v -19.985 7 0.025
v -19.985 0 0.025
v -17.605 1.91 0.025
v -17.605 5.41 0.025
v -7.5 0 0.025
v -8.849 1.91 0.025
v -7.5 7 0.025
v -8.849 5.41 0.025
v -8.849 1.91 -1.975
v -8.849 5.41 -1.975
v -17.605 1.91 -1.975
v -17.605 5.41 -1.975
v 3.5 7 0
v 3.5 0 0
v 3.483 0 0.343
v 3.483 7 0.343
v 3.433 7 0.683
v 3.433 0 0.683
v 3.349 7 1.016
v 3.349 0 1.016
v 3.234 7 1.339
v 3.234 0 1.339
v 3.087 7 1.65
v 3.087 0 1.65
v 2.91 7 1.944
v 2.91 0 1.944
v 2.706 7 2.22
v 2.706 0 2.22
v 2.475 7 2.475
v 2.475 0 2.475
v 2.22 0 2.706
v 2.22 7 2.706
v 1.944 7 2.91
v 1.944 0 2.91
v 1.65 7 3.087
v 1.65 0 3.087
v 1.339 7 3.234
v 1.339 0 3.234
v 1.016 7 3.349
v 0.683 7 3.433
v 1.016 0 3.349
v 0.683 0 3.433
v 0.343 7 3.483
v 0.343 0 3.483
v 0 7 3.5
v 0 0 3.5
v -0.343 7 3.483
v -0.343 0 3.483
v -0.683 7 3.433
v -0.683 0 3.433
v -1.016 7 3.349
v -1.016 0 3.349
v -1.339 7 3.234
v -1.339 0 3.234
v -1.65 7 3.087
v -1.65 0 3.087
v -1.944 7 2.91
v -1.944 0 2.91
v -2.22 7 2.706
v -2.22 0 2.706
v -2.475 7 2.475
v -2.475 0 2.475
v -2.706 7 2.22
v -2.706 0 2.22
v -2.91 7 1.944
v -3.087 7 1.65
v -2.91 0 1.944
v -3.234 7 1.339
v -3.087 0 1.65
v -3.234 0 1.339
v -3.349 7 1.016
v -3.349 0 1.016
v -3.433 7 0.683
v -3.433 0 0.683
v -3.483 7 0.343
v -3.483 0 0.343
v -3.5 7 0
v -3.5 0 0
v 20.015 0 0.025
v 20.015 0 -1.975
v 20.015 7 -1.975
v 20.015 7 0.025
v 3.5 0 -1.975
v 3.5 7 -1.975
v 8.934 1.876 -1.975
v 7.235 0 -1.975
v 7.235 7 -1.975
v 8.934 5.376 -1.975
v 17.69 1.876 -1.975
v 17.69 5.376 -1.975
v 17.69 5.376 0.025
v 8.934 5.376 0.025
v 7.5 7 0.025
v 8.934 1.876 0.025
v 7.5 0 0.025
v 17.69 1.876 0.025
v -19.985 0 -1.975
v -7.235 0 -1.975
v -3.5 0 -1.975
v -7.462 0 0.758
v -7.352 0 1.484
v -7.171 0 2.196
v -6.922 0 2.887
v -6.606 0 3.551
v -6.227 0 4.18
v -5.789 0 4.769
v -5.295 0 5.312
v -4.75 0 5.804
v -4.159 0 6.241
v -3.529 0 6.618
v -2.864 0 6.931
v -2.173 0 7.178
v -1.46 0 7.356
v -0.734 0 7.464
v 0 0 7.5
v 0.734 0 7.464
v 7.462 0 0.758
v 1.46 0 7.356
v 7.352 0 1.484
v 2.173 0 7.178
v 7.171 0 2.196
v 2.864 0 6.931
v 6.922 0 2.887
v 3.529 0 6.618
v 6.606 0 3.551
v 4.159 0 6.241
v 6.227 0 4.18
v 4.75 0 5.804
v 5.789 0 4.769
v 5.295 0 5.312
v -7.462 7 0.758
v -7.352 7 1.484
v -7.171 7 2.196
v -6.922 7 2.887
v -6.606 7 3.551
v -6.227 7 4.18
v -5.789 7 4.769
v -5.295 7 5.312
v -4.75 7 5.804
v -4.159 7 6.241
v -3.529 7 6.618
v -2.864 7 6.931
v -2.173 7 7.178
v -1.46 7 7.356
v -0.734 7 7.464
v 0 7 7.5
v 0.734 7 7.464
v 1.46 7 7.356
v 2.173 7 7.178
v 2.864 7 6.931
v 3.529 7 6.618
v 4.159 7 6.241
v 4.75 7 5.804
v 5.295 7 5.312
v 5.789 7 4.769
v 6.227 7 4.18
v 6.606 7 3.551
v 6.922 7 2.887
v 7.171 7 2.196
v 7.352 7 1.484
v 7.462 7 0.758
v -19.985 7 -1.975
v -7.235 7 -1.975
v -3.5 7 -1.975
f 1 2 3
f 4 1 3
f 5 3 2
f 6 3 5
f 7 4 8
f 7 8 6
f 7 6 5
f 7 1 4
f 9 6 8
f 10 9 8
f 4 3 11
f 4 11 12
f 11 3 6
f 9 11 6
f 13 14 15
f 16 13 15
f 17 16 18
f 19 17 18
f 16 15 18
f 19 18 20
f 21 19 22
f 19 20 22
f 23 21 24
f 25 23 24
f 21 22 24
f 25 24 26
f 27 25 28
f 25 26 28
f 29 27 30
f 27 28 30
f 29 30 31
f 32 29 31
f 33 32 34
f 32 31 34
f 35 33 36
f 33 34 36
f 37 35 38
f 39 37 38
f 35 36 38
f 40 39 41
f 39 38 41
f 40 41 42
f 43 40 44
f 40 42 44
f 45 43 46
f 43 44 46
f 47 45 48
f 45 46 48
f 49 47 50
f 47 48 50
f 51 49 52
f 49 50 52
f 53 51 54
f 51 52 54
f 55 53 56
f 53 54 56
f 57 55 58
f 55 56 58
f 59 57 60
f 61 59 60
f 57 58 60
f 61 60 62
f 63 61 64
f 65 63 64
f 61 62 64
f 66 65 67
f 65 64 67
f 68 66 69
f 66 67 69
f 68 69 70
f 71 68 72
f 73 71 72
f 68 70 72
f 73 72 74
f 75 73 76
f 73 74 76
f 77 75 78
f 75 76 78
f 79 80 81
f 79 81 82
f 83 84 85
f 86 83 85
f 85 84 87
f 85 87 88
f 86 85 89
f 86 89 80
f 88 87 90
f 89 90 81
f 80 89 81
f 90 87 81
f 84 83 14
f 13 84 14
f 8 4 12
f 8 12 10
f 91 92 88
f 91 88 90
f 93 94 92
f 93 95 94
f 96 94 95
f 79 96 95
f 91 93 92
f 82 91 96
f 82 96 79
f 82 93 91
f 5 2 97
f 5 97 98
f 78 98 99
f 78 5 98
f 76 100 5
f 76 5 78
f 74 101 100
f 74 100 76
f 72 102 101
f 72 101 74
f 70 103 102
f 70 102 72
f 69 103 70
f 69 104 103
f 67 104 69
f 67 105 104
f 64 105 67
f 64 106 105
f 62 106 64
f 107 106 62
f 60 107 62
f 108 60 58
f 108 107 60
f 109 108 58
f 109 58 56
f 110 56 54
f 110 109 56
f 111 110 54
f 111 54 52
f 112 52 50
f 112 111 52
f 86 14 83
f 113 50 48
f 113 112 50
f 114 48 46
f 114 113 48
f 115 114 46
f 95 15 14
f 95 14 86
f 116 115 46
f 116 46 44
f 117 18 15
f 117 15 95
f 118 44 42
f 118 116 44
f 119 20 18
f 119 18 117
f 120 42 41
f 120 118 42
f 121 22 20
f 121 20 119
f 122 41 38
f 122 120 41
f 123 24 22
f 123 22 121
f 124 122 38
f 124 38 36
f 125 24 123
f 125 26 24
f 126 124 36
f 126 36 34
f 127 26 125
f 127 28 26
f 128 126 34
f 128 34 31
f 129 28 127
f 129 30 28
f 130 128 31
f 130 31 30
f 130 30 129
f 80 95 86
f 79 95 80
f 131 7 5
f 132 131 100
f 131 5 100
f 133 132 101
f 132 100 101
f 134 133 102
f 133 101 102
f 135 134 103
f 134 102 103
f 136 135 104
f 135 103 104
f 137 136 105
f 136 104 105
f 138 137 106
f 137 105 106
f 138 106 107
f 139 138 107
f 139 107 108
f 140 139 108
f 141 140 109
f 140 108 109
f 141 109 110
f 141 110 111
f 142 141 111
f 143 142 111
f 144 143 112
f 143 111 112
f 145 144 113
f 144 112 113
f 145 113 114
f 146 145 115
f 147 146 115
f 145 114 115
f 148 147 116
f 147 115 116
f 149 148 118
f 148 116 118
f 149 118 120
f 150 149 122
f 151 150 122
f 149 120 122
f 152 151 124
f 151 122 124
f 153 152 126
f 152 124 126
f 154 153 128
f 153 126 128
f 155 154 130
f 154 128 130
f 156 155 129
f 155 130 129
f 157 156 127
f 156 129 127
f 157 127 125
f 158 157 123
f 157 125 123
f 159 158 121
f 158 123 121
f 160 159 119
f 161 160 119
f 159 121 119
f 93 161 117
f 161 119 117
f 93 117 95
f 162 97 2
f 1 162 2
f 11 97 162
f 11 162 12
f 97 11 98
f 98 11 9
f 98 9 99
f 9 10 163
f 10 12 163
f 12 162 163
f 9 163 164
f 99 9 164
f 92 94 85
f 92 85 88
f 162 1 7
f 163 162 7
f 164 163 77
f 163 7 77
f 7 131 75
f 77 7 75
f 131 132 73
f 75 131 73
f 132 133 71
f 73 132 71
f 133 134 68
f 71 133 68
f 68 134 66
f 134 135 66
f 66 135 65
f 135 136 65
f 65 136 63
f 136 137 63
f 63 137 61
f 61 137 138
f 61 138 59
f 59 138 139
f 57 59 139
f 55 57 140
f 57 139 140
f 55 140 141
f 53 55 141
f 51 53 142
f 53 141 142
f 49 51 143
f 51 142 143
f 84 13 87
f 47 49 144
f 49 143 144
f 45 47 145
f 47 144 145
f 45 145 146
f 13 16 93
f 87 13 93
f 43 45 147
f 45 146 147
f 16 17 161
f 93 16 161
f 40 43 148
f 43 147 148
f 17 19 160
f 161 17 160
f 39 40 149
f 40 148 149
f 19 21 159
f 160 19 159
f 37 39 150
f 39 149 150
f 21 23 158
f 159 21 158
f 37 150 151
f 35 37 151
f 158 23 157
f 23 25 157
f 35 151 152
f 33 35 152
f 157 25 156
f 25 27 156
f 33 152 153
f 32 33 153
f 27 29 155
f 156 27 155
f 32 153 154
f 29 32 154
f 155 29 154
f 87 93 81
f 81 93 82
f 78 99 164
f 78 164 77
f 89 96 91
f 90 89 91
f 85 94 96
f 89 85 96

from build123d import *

# Parameters (mm, degrees)
SKETCH_1_R          = 7.5
EXTRUDE_4_DEPTH     = 7
SKETCH_4_W          = 40
SKETCH_4_H          = 2
EXTRUDE_5_DEPTH     = 7
SKETCH_5_W          = 16.420397205
SKETCH_5_H          = 7.153518057
CUT_EXTRUDE_1_DEPTH = 7
SKETCH_6_R          = 5.50001496
CUT_EXTRUDE_2_DEPTH = 7
SKETCH_7_W          = 11.00002992
SKETCH_7_H          = 1.975158718
CUT_EXTRUDE_3_DEPTH = 7
SKETCH_9_W          = 9.755837775
SKETCH_9_H          = 3.5
SKETCH_9_W_2        = 9.755837774
CUT_EXTRUDE_4_DEPTH = 7
SKETCH_10_W         = 1
SKETCH_10_H         = 3.5
EXTRUDE_6_DEPTH     = 2
SKETCH_11_W         = 1
SKETCH_11_H         = 3.5
EXTRUDE_7_DEPTH     = 2
SKETCH_12_R         = 5.944171322
EXTRUDE_8_DEPTH     = 7
SKETCH_13_W         = 14.038978355
SKETCH_13_H         = 4.452309985
CUT_EXTRUDE_5_DEPTH = 7
SKETCH_14_R         = 3.5
CUT_EXTRUDE_6_DEPTH = 7
SKETCH_15_W         = 7
SKETCH_15_H         = 1.975158718
CUT_EXTRUDE_7_DEPTH = 7


with BuildPart() as part:
    # 草图1 → 凸台-拉伸4 (new body)
    with BuildSketch(Plane(origin=(0, 0, 0), x_dir=(1, 0, 0), z_dir=(0, 1, 0))):
        with Locations(Location((0, 0, 0), (0, 0, 270))):
            Circle(SKETCH_1_R)
    extrude(amount=EXTRUDE_4_DEPTH)

    # 草图4 → 凸台-拉伸5 (add)
    with BuildSketch(Plane.XZ):
        with Locations((0.014666229, -0.975158718)):
            Rectangle(SKETCH_4_W, SKETCH_4_H)
    extrude(amount=-EXTRUDE_5_DEPTH)

    # 草图5 → 切除-拉伸1 (cut)
    with BuildSketch(Plane(origin=(0, 0, 0), x_dir=(-1, 0, 0), z_dir=(0, -1, 0))):
        with Locations((-0.974955135, 5.551917747)):
            Rectangle(SKETCH_5_W, SKETCH_5_H)
    extrude(amount=-CUT_EXTRUDE_1_DEPTH, mode=Mode.SUBTRACT)

    # 草图6 → 切除-拉伸2 (cut)
    with BuildSketch(Plane.XZ):
        Circle(SKETCH_6_R)
    extrude(amount=-CUT_EXTRUDE_2_DEPTH, mode=Mode.SUBTRACT)

    # 草图7 → 切除-拉伸3 (cut)
    with BuildSketch(Plane(origin=(0, 7, 0), x_dir=(1, 0, 0), z_dir=(0, 1, 0))):
        with Locations((0, 0.987579359)):
            Rectangle(SKETCH_7_W, SKETCH_7_H)
    extrude(amount=-CUT_EXTRUDE_3_DEPTH, mode=Mode.SUBTRACT)

    # 草图9 → 切除-拉伸4 (cut)
    with BuildSketch(Plane.XY.offset(0.024841282)):
        with Locations((-13.727128122, 3.659671281)):
            Rectangle(SKETCH_9_W, SKETCH_9_H)
        with Locations((13.812208225, 3.62574666)):
            Rectangle(SKETCH_9_W_2, SKETCH_9_H)
    extrude(amount=-CUT_EXTRUDE_4_DEPTH, mode=Mode.SUBTRACT)

    # 草图10 → 凸台-拉伸6 (add)
    with BuildSketch(Plane.XY.offset(0.024841282)):
        with Locations((18.190127112, 3.62574666)):
            Rectangle(SKETCH_10_W, SKETCH_10_H)
    extrude(amount=-EXTRUDE_6_DEPTH)

    # 草图11 → 凸台-拉伸7 (add)
    with BuildSketch(Plane.XY.offset(0.024841282)):
        with Locations((-18.10504701, 3.659671281)):
            Rectangle(SKETCH_11_W, SKETCH_11_H)
    extrude(amount=-EXTRUDE_7_DEPTH)

    # 草图12 → 凸台-拉伸8 (add)
    with BuildSketch(Plane(origin=(0, 0, 0), x_dir=(-1, 0, 0), z_dir=(0, -1, 0))):
        Circle(SKETCH_12_R)
    extrude(amount=-EXTRUDE_8_DEPTH)

    # 草图13 → 切除-拉伸5 (cut)
    with BuildSketch(Plane(origin=(0, 0, 0), x_dir=(-1, 0, 0), z_dir=(0, -1, 0))):
        with Locations((-1.413071361, 4.201313711)):
            Rectangle(SKETCH_13_W, SKETCH_13_H)
    extrude(amount=-CUT_EXTRUDE_5_DEPTH, mode=Mode.SUBTRACT)

    # 草图14 → 切除-拉伸6 (cut)
    with BuildSketch(Plane.XZ):
        Circle(SKETCH_14_R)
    extrude(amount=-CUT_EXTRUDE_6_DEPTH, mode=Mode.SUBTRACT)

    # 草图15 → 切除-拉伸7 (cut)
    with BuildSketch(Plane.XZ):
        with Locations((0, -0.987579359)):
            Rectangle(SKETCH_15_W, SKETCH_15_H)
    extrude(amount=-CUT_EXTRUDE_7_DEPTH, mode=Mode.SUBTRACT)


solid = part.part
